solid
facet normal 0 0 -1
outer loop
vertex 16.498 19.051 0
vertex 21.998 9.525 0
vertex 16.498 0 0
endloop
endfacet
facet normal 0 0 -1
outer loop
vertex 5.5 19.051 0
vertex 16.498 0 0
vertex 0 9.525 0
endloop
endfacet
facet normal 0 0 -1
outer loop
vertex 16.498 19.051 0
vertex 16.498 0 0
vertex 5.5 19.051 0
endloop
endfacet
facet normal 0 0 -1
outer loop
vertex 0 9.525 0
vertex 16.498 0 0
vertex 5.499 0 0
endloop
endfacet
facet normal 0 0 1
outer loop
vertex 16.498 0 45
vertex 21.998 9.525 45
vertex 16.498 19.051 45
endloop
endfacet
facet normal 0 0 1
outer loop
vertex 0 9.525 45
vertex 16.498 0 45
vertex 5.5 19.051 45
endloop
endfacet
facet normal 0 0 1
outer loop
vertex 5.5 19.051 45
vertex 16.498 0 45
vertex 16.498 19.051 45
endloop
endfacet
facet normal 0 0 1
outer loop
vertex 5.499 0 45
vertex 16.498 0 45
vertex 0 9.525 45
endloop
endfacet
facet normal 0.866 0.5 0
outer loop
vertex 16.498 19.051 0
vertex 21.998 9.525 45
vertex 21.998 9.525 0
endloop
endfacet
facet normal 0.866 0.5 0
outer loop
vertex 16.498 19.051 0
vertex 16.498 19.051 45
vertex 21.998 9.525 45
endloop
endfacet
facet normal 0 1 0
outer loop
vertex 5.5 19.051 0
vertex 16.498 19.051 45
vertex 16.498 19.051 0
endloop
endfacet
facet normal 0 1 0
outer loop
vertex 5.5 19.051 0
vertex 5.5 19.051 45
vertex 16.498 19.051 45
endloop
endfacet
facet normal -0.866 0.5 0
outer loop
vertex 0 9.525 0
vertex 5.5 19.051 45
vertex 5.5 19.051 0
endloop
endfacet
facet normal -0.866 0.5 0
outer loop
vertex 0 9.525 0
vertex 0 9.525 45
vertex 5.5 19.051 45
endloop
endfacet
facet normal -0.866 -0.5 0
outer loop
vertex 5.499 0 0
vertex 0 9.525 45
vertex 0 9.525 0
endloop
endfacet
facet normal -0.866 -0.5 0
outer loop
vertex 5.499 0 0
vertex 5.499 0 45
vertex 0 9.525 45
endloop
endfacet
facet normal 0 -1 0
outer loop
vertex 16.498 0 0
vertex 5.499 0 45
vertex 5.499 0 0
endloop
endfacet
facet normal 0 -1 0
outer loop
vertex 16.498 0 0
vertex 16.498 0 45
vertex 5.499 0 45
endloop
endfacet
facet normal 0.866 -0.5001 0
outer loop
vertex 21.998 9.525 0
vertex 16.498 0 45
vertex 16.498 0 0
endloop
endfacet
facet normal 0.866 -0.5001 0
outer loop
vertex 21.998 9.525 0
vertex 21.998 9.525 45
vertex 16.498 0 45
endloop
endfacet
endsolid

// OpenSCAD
$fn = 32;

// ----------------------------------------------------------------------
// Key bar: hex key, 45 mm thick
// ----------------------------------------------------------------------

// --- parameters (mm) ---
profile_height = 45;      // extrusion height
profile_points = 6;       // points of the closed outline

profile = [[21.998, 9.525], [16.498, 19.051], [5.5, 19.051], [0, 9.525], [5.499, 0], [16.498, 0]];  // single closed polygon, 6 points, counter clockwise

// --- the one profile operation ---
linear_extrude(height = profile_height) polygon(points = profile);
